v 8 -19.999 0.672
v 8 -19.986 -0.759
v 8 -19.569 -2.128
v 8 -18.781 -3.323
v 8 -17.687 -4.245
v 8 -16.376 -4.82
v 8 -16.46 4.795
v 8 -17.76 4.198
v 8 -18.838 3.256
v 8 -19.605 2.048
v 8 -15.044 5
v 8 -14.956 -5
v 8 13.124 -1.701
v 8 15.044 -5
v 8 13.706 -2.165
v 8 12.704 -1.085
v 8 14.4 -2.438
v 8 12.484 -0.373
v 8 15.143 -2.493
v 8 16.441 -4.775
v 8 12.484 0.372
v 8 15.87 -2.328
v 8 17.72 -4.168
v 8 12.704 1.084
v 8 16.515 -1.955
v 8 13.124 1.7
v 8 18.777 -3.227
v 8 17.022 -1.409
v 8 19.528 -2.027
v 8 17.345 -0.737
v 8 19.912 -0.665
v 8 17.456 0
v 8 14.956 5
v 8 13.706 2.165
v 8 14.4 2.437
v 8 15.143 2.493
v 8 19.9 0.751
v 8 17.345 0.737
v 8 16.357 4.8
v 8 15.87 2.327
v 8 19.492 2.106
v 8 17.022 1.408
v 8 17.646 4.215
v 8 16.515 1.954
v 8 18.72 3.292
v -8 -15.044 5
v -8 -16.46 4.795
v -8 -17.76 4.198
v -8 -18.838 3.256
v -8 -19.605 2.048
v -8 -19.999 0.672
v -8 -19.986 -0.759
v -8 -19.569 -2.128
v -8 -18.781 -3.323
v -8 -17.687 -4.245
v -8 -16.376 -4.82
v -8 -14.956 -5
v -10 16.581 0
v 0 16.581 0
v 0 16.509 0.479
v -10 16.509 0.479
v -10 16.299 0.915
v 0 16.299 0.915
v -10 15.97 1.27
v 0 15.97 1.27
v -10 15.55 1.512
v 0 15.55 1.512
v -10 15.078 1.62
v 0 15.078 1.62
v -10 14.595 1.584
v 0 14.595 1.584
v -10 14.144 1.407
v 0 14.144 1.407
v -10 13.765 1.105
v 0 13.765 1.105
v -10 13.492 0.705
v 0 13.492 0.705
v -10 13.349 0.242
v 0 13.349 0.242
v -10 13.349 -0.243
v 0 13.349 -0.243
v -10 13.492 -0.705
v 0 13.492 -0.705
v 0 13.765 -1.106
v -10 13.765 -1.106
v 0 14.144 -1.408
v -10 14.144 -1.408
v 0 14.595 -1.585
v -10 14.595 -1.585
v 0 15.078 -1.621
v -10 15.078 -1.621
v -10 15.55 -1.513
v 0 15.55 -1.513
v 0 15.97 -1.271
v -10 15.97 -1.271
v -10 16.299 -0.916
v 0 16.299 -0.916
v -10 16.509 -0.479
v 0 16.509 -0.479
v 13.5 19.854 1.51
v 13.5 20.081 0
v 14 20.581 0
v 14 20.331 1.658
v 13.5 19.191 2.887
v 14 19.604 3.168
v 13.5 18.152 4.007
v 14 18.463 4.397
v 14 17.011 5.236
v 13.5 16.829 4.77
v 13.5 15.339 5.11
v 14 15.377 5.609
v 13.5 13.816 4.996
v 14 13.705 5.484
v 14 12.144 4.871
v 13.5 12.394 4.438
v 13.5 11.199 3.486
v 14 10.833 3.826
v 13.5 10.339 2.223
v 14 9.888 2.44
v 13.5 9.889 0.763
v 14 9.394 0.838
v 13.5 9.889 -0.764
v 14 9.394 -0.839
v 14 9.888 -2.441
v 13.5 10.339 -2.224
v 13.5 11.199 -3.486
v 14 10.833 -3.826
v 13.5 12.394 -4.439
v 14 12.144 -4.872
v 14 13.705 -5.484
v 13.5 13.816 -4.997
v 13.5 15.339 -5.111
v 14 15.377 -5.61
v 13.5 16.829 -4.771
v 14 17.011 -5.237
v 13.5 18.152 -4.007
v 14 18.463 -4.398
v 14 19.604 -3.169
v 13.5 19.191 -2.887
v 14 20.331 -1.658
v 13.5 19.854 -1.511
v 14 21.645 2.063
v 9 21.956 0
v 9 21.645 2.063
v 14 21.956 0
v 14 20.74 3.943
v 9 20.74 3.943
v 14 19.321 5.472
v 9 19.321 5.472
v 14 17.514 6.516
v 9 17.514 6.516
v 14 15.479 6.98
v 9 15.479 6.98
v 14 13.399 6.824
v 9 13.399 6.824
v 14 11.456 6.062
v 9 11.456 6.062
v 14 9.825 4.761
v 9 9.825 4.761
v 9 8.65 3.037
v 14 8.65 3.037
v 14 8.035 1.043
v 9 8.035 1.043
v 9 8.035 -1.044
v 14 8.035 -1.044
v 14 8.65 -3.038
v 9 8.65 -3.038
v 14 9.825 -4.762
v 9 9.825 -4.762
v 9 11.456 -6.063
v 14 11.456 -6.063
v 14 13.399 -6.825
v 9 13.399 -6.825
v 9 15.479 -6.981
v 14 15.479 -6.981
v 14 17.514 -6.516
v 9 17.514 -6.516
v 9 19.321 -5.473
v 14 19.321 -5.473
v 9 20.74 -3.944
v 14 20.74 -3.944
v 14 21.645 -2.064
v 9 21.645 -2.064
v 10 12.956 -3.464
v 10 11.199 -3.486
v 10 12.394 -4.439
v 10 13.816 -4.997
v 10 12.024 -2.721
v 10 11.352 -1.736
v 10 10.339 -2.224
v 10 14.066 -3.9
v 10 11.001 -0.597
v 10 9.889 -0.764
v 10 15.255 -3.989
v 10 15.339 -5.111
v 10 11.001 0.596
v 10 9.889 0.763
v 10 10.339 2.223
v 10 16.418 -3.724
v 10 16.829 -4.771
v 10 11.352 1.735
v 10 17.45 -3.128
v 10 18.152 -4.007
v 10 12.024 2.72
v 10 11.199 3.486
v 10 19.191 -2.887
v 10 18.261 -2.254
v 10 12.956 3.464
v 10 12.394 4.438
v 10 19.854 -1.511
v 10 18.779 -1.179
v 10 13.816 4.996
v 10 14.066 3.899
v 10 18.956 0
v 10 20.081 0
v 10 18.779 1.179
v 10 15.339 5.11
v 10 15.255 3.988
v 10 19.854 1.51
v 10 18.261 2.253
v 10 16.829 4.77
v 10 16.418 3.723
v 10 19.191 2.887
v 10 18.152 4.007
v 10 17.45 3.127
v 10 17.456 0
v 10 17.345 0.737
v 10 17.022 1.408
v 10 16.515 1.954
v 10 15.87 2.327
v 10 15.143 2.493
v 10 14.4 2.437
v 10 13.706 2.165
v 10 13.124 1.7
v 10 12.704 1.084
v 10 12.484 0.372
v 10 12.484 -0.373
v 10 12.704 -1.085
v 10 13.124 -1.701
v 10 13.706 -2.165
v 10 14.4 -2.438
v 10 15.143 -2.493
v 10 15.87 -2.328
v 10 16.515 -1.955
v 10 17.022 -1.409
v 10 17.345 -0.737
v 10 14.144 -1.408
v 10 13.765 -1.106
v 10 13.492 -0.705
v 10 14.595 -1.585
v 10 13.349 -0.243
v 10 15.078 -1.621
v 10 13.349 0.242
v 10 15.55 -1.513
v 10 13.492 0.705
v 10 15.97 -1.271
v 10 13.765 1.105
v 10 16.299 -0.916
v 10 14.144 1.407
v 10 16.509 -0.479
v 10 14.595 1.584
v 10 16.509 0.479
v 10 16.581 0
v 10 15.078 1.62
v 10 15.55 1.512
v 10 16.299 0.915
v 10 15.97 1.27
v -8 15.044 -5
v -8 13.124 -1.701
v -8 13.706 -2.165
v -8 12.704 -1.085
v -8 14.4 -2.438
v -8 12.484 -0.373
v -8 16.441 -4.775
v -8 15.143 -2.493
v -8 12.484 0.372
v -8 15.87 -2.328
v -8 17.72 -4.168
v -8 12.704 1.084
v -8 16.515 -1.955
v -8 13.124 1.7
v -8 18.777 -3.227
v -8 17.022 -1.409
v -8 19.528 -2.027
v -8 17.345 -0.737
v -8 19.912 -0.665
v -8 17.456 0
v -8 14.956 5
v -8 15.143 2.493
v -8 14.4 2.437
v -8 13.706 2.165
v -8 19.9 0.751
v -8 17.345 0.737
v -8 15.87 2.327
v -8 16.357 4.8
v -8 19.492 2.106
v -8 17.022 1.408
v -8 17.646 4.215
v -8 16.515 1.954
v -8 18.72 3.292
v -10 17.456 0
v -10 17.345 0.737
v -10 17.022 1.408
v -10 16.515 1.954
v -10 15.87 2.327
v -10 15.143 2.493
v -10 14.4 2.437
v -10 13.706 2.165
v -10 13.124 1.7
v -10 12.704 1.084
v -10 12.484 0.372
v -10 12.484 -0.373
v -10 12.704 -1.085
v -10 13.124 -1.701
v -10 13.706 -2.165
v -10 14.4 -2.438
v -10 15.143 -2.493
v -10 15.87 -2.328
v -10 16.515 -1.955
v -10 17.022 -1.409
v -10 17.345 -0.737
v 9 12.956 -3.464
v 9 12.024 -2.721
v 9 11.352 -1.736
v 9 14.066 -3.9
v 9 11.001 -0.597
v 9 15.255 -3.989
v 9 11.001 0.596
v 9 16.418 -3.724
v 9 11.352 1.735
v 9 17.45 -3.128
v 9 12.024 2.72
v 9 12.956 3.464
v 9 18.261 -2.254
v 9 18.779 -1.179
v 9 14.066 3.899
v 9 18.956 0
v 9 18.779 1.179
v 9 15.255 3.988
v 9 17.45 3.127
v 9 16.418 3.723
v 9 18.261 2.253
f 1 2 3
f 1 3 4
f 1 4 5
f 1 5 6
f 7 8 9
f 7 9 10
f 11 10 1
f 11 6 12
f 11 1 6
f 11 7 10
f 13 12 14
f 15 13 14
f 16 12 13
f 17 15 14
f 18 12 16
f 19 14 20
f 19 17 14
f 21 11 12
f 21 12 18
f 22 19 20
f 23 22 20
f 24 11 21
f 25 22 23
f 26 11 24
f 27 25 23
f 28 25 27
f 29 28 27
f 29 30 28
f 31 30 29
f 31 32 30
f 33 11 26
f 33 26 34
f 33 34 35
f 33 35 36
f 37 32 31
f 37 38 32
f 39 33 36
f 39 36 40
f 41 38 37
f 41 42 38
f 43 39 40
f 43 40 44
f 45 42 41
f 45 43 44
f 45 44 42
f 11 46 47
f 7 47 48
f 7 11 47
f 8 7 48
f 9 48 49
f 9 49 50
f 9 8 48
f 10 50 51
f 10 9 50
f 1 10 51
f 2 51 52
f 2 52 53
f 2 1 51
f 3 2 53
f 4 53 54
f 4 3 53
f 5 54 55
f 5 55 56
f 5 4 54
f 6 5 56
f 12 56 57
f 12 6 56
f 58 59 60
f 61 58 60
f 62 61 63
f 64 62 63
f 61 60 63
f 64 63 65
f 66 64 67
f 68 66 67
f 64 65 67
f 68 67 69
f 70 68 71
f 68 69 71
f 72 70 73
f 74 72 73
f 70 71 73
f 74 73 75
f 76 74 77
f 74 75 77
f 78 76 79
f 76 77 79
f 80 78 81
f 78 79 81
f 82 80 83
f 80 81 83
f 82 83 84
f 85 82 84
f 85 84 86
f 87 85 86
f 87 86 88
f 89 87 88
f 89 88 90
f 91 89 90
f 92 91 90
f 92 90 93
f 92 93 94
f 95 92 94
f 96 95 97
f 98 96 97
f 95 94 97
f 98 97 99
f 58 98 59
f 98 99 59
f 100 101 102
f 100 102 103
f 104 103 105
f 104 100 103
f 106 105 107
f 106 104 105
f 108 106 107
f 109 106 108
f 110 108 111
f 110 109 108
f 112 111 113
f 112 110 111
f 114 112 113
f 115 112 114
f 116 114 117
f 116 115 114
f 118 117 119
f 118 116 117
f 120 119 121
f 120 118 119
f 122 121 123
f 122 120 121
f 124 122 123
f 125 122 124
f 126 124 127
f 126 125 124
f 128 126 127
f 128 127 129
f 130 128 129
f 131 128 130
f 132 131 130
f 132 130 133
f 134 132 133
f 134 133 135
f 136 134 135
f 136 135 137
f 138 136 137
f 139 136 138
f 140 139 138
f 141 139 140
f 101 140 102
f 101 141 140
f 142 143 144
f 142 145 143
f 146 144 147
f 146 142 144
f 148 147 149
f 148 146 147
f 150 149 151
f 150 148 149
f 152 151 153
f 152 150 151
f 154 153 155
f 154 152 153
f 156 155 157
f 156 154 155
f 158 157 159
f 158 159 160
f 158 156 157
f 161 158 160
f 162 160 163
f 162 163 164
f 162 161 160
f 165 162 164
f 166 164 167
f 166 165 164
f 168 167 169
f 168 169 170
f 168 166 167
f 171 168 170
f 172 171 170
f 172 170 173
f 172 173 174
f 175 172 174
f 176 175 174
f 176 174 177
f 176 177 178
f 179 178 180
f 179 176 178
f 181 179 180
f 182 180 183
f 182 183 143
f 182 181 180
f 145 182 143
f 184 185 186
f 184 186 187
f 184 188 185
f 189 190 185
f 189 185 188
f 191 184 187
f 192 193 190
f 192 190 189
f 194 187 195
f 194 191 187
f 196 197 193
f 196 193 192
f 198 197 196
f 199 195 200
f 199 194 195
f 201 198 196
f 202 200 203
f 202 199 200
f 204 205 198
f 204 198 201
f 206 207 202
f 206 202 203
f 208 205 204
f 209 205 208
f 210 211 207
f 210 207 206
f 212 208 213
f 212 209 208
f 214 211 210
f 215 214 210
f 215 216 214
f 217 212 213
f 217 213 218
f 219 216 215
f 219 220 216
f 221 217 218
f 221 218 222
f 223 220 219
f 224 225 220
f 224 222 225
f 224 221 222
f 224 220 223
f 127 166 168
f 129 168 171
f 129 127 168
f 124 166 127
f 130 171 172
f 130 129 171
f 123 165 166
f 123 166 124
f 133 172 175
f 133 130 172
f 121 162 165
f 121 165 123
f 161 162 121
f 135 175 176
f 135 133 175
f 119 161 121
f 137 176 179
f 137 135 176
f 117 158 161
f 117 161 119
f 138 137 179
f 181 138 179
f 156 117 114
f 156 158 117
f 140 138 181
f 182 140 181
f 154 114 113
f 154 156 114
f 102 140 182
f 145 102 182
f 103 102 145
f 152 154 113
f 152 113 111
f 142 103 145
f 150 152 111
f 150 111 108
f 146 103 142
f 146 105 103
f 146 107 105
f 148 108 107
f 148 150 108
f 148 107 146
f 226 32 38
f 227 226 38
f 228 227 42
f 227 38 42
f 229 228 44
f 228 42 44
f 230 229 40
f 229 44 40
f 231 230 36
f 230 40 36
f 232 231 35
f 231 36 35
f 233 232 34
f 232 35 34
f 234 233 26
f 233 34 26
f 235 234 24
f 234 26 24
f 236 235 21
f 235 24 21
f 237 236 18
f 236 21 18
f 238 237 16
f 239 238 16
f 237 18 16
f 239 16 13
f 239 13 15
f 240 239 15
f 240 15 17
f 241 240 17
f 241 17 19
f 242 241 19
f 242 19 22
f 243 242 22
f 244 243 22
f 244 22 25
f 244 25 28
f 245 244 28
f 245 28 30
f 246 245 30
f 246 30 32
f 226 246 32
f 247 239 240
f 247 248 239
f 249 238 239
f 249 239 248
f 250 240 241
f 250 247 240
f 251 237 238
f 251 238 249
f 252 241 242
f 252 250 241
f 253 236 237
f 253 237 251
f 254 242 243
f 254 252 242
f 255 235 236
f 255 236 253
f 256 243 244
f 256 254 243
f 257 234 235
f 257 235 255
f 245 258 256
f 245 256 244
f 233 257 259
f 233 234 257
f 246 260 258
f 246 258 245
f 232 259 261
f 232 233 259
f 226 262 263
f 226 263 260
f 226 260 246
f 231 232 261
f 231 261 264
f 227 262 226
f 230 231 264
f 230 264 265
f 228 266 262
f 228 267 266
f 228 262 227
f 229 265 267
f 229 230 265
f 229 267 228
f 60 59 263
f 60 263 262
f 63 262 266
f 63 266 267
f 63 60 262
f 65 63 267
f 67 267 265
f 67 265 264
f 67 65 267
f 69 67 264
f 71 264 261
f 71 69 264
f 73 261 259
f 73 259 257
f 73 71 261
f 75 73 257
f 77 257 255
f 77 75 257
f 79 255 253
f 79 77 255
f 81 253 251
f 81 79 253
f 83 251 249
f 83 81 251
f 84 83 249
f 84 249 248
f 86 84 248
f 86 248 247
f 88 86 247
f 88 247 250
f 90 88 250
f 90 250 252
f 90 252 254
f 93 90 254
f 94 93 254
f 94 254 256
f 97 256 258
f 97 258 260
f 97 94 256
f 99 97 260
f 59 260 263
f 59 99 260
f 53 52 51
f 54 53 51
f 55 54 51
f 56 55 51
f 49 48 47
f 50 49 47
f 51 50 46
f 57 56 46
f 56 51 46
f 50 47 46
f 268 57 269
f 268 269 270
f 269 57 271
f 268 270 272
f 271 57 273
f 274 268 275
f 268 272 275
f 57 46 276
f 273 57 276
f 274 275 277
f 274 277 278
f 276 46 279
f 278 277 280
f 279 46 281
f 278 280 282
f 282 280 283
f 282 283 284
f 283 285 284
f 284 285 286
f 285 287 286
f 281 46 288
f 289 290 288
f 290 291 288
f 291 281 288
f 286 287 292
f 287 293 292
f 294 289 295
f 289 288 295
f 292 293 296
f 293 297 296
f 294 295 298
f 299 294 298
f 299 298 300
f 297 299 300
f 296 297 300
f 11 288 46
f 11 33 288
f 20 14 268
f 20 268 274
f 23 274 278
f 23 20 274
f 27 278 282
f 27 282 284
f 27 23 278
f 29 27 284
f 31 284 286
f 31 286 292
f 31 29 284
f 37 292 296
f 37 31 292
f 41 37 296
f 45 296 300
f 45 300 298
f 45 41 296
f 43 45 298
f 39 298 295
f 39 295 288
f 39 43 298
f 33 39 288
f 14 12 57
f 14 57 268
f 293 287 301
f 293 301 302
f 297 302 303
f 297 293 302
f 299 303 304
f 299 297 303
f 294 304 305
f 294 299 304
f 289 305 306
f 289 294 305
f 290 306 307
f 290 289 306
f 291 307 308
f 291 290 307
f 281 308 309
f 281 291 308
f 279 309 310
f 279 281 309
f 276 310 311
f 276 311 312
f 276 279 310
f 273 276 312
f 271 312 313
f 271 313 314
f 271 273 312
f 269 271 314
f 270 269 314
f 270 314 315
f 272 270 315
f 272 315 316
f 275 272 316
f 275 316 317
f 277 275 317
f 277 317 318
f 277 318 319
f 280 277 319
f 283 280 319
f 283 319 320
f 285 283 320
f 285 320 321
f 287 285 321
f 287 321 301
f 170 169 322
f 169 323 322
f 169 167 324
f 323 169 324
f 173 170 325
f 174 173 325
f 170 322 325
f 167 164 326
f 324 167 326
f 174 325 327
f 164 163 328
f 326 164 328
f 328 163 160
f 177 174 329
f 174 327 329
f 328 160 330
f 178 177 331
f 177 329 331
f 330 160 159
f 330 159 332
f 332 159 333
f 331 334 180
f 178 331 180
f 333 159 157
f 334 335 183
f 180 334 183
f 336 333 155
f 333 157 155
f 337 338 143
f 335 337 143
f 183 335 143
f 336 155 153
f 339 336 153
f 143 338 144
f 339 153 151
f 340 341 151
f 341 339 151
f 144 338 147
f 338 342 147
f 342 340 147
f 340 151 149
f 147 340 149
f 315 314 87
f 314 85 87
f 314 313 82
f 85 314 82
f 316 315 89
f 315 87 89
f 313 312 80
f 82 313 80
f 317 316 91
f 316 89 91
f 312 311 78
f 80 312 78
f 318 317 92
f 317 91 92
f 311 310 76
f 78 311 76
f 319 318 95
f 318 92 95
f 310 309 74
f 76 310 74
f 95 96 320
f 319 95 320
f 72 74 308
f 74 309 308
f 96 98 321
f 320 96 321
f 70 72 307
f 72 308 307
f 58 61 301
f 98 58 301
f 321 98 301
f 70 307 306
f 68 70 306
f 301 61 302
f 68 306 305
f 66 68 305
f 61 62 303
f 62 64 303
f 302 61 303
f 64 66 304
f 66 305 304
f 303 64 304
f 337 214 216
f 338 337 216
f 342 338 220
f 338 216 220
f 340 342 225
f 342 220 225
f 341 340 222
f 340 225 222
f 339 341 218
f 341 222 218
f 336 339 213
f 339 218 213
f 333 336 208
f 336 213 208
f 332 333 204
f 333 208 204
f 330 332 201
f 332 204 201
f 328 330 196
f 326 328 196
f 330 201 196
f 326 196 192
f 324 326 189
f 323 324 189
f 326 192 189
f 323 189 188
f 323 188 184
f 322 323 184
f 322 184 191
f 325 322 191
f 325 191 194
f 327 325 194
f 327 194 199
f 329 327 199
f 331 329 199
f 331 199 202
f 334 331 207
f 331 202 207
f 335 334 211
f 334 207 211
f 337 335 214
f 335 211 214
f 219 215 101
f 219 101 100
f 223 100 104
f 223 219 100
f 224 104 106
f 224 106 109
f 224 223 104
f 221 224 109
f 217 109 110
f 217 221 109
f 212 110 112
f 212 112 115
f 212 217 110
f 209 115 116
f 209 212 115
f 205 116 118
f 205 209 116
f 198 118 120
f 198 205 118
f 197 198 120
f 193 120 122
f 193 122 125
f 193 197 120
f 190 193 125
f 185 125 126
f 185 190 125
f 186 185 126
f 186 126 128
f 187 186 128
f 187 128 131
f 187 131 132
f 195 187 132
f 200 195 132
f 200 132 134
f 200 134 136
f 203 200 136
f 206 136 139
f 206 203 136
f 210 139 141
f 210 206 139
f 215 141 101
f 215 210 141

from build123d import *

# Parameters (mm, degrees)
F1_DEPTH      = 8
F1_DEPTH_BACK = 8
F2_R          = 2.5
F3_DEPTH      = 10
F3_DEPTH_BACK = 10
F4_R          = 1.625
F5_DEPTH      = 10
F5_DEPTH_BACK = 10
F6_R          = 5.125
F6_R_2        = 4
F7_DEPTH      = 1
F8_R          = 7
F8_R_2        = 5.125
F9_DEPTH      = 4
F9_DEPTH_BACK = 1
F10_SIZE      = 0.5


with BuildPart() as f1:
    # F0 (on Right) → F1 (new body, two sides)
    with BuildSketch(Plane.YZ) as f1_sk:
        with BuildLine():
            ThreePointArc((-15.0436673748, 5), (-20.0438580552, -0.0440504081), (-14.9563326252, -5))
            Line((-14.9563326252, -5), (15.0436673748, -5))
            ThreePointArc((15.0436673748, -5), (19.9565233055, 0.0432876722), (14.9563326252, 5))
            Line((14.9563326252, 5), (-15.0436673748, 5))
        make_face()
    extrude(amount=F1_DEPTH)
    extrude(f1_sk.sketch, amount=-F1_DEPTH_BACK)

    # F2 (on Right) → F3 (join, two sides)
    with BuildSketch(Plane.YZ) as f3_sk:
        with Locations((14.9563326252, -0.0003813679)):
            Circle(F2_R)
    extrude(amount=F3_DEPTH)
    extrude(f3_sk.sketch, amount=-F3_DEPTH_BACK)

    # F4 (on Right) → F5 (cut, two sides)
    with BuildSketch(Plane.YZ) as f5_sk:
        with Locations((14.9563326252, -0.0003813679)):
            Circle(F4_R)
    extrude(amount=-F5_DEPTH, mode=Mode.SUBTRACT)
    extrude(f5_sk.sketch, amount=F5_DEPTH_BACK, mode=Mode.SUBTRACT)


with BuildPart() as f7:
    # F6 (on face) → F7 (new body)
    with BuildSketch(Plane.YZ.offset(10)):
        with Locations((14.9563326252, -0.0003813679)):
            Circle(F6_R)
        with Locations((14.9563326252, -0.0003813679)):
            Circle(F6_R_2, mode=Mode.SUBTRACT)
    extrude(amount=-F7_DEPTH)

    # F8 (on face) → F9 (join, two sides)
    with BuildSketch(Plane.YZ.offset(10)) as f9_sk:
        with Locations((14.9563326252, -0.0003813679)):
            Circle(F8_R)
        with Locations((14.9563326252, -0.0003813679)):
            Circle(F8_R_2, mode=Mode.SUBTRACT)
    extrude(amount=F9_DEPTH)
    extrude(f9_sk.sketch, amount=-F9_DEPTH_BACK)

    # F10
    f10_edges = [f7.edges().sort_by_distance(p)[0] for p in [
        (14, 9.831333, -0.000381),
    ]]
    chamfer(f10_edges, length=F10_SIZE)


solid = Compound([f1.part, f7.part])
